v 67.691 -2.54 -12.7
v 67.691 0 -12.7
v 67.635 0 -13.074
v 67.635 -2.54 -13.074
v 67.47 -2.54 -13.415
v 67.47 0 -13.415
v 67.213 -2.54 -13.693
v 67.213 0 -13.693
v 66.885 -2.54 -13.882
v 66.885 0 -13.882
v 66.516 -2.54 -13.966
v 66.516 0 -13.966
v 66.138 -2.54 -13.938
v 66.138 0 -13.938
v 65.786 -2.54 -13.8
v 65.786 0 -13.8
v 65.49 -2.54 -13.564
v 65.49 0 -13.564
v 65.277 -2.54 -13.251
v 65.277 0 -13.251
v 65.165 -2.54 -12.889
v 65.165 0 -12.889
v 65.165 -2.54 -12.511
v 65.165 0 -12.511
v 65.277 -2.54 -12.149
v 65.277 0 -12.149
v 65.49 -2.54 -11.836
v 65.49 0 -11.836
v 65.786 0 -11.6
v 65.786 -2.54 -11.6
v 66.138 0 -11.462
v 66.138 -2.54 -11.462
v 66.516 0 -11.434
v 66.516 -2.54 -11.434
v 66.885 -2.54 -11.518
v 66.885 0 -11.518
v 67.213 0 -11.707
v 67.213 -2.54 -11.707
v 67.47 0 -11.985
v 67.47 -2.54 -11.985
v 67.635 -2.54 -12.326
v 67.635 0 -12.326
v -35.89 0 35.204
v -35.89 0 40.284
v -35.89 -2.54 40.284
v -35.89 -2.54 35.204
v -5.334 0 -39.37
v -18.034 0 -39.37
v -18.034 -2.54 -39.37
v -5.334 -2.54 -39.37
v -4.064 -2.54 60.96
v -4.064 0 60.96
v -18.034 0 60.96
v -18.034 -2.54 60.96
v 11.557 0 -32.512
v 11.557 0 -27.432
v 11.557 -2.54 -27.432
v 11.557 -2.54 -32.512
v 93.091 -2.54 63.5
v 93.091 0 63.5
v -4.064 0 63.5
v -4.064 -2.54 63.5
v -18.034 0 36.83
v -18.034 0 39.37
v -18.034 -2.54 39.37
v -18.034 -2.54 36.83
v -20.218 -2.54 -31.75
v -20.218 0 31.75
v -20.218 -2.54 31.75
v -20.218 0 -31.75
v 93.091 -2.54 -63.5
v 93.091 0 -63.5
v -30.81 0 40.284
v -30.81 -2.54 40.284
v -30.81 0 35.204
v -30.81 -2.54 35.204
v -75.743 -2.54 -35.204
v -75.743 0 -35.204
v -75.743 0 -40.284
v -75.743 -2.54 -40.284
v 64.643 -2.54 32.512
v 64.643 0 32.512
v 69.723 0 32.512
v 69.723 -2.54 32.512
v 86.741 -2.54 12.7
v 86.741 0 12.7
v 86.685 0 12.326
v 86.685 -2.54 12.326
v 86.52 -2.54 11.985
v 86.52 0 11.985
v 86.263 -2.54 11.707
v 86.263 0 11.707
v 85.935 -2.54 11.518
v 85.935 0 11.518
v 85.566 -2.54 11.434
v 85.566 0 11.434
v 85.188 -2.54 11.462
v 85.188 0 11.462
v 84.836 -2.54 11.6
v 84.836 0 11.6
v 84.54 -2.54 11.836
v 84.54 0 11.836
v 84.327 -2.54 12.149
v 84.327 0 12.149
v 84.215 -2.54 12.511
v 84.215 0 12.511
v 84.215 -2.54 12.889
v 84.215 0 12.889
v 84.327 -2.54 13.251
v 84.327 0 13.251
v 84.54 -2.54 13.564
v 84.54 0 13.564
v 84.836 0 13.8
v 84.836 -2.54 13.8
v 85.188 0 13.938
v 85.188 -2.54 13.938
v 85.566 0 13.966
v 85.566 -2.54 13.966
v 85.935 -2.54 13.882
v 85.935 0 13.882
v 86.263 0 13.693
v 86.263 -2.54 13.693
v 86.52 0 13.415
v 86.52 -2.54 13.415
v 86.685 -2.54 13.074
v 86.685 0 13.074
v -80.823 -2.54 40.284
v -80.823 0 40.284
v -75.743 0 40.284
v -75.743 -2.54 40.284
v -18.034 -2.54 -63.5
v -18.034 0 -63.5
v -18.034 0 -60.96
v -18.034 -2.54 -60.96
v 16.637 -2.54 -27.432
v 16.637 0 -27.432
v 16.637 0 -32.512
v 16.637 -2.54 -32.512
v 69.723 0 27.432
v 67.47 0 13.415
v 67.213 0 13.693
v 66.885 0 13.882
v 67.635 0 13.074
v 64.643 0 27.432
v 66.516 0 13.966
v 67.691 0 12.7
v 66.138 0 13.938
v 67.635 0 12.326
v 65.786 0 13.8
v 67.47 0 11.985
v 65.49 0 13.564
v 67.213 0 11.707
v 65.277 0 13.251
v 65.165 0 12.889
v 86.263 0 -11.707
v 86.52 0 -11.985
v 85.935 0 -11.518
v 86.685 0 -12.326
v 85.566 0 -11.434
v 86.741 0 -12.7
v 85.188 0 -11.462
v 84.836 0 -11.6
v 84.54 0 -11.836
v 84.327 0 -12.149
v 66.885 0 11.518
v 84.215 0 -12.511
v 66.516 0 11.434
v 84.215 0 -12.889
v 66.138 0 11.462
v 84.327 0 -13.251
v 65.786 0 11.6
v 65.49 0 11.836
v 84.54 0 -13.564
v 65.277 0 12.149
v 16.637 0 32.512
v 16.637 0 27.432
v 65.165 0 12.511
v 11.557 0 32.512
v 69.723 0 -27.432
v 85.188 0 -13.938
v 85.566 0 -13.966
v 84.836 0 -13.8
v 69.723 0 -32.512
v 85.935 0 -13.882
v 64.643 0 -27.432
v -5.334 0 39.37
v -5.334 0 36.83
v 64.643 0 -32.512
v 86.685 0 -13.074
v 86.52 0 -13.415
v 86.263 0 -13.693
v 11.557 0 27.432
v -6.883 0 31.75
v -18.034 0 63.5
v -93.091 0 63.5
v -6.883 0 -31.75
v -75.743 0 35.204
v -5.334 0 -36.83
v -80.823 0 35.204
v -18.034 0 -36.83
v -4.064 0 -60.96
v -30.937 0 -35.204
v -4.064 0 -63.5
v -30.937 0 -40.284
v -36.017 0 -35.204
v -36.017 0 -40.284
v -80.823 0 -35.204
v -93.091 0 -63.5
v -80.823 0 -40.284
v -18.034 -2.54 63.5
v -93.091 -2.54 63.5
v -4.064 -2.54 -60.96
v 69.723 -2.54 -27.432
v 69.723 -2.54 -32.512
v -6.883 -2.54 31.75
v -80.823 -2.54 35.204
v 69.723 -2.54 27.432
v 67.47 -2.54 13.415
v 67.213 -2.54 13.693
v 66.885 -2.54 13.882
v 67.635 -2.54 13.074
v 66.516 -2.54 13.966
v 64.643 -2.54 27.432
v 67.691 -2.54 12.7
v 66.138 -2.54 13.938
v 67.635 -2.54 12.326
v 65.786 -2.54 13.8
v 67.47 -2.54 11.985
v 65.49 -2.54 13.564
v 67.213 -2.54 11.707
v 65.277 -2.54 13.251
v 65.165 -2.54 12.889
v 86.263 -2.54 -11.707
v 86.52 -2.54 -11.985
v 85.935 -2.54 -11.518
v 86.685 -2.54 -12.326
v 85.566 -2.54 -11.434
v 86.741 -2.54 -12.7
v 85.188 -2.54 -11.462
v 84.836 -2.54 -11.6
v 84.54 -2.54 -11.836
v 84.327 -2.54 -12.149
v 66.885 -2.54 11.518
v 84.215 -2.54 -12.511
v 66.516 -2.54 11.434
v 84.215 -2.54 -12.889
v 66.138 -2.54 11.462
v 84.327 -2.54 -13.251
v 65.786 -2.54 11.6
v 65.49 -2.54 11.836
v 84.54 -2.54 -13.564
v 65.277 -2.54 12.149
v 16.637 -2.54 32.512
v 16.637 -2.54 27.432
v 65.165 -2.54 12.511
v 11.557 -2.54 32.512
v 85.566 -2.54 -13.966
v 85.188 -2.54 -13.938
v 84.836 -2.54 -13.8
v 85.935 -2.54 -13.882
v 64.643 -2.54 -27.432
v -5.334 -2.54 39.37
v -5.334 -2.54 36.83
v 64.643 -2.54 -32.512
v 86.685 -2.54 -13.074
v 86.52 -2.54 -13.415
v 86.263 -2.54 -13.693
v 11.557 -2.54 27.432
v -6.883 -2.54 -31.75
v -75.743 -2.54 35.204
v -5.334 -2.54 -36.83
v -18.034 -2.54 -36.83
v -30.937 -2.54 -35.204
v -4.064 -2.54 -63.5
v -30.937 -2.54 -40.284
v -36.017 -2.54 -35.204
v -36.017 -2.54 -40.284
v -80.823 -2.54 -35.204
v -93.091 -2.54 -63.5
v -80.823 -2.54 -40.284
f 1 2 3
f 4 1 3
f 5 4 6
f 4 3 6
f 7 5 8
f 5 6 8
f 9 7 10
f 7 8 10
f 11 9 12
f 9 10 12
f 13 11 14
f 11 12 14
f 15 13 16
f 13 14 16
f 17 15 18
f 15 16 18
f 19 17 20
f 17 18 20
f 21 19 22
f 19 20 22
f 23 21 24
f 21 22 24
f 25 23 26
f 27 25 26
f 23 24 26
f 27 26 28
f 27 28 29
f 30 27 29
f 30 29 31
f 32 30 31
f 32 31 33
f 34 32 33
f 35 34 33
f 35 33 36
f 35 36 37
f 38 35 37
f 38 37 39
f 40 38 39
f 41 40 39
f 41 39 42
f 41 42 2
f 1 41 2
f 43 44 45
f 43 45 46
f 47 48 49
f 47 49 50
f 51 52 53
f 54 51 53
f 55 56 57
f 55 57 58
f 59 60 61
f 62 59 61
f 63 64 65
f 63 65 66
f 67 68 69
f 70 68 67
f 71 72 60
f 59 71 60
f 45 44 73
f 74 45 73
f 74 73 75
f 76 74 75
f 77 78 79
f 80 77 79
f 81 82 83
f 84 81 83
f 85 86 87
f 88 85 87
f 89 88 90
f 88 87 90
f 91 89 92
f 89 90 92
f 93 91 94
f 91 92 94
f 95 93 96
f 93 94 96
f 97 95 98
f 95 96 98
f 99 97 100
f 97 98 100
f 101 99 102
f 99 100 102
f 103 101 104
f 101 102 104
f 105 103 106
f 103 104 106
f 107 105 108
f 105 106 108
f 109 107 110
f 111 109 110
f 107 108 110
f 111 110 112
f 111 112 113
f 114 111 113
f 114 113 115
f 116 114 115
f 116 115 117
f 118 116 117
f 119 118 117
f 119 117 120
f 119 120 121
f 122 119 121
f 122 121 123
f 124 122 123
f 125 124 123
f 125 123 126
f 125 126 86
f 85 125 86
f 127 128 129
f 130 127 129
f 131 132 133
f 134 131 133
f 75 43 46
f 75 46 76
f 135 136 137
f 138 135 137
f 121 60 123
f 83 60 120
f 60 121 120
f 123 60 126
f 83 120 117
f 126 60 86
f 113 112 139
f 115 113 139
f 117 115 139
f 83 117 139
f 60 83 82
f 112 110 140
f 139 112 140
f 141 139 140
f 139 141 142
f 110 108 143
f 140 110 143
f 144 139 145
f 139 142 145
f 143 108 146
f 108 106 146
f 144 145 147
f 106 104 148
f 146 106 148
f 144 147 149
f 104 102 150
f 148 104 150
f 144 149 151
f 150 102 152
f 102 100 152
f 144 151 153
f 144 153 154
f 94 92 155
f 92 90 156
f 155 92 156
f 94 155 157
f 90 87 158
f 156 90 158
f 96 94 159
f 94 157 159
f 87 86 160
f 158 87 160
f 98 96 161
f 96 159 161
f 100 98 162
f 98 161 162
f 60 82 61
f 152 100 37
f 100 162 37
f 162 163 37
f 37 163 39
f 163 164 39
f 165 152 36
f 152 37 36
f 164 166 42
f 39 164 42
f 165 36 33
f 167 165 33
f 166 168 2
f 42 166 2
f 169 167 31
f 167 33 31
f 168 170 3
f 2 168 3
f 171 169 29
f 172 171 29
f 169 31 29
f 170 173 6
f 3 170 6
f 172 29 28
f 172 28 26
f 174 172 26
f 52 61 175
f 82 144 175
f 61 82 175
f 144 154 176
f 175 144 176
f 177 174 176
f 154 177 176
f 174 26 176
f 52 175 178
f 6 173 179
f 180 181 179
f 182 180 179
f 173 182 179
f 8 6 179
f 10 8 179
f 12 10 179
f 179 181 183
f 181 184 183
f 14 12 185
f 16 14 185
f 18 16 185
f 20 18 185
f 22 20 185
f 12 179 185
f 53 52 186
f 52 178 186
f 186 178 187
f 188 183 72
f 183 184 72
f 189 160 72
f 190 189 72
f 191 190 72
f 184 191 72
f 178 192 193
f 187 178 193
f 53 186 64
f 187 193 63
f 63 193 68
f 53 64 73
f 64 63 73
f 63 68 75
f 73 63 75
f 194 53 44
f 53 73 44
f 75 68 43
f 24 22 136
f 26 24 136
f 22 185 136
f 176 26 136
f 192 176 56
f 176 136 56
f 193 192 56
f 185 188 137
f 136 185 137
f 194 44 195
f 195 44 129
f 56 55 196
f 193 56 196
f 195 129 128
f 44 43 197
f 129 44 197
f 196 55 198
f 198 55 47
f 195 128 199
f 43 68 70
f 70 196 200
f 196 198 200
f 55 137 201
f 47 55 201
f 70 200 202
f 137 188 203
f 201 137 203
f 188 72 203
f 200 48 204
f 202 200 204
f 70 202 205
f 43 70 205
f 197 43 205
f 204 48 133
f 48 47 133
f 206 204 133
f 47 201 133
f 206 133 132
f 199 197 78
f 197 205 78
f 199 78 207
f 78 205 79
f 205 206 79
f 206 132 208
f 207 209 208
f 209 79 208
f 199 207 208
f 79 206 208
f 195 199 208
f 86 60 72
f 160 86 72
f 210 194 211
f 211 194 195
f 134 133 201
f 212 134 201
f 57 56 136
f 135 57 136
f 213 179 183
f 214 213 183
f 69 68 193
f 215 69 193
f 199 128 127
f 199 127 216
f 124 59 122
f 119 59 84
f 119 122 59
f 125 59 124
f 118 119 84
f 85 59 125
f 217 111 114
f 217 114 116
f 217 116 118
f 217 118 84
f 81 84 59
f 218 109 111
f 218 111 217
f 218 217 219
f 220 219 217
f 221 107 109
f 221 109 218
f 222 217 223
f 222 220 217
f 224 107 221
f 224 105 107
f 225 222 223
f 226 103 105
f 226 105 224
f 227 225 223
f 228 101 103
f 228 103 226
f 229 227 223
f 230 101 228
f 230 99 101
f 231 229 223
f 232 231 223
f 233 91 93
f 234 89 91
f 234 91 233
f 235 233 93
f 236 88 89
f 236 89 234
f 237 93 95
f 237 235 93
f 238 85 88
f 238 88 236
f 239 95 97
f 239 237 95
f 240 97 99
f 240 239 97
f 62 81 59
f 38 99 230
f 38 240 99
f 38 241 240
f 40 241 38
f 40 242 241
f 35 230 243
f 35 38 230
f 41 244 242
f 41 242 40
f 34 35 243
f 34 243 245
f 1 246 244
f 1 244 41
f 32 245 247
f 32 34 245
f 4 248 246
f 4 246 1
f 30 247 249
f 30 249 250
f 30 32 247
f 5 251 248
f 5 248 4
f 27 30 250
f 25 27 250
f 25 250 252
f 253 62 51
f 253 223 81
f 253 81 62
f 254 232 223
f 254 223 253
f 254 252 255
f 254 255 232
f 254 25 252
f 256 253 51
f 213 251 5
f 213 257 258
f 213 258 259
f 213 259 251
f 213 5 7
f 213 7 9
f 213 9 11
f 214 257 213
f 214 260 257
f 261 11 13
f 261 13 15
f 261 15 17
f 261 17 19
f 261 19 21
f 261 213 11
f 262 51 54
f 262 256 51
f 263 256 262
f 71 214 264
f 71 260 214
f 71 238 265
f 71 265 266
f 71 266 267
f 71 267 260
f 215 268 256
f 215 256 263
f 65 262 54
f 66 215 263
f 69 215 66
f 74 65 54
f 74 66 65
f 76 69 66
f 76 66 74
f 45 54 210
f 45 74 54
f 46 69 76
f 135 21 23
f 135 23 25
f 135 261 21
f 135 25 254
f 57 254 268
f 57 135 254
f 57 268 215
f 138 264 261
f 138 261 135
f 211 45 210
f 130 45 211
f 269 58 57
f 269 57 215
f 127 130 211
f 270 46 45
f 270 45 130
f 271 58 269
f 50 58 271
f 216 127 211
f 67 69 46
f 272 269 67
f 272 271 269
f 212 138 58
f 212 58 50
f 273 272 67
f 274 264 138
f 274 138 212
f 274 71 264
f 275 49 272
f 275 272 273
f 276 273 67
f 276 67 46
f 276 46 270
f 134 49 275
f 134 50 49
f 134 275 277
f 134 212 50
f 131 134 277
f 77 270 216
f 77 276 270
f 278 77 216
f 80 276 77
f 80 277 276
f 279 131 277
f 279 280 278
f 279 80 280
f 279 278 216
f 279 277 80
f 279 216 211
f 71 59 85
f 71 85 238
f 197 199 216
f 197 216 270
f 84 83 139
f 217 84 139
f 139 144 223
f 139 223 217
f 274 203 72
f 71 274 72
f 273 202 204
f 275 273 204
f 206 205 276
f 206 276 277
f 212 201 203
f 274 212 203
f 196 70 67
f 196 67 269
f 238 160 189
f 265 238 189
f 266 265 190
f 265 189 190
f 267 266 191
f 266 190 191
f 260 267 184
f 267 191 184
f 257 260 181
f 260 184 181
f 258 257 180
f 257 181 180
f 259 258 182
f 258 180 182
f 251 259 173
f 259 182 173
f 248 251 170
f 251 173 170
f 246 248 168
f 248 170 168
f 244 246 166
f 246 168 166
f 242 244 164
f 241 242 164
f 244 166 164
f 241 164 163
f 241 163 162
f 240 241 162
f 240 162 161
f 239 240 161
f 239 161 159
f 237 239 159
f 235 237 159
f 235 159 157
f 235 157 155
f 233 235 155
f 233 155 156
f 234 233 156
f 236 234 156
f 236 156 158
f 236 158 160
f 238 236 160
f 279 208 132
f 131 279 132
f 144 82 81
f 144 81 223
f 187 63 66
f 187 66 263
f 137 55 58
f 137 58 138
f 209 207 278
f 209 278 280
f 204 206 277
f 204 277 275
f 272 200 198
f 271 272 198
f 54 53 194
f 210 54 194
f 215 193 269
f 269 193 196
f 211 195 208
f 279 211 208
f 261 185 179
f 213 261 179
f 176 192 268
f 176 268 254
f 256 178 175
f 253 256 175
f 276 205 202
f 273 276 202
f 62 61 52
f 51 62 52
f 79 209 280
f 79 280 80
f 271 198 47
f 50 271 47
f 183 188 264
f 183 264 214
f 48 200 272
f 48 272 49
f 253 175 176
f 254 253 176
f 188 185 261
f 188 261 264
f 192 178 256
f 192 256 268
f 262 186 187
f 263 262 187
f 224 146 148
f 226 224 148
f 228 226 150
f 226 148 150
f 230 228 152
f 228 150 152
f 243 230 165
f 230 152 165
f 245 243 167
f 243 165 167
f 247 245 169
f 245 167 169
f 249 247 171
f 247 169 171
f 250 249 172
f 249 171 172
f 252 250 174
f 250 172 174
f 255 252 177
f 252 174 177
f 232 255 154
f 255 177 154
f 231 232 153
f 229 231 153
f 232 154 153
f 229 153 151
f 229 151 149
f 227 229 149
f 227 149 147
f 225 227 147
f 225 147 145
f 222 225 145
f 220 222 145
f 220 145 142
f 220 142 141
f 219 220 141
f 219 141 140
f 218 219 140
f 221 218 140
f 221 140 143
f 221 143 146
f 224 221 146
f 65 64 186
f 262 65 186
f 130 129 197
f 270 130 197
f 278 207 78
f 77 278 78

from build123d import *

# Parameters (mm, degrees)
BOSS_EXTRUDE1_DEPTH = 2.54
CUT_EXTRUDE1_REACH  = 4.54
SKETCH2_R           = 1.27
SKETCH2_W           = 5.08
SKETCH2_H           = 5.08
SKETCH2_W_2         = 13.335
SKETCH2_H_2         = 63.5
SKETCH2_W_3         = 12.7
SKETCH2_H_3         = 2.54


with BuildPart() as part:
    # Sketch1 → Boss-Extrude1 (new body)
    with BuildSketch(Plane(origin=(0, 0, 0), x_dir=(1, 0, 0), z_dir=(0, 1, 0))):
        Polygon((-18.034, 63.5), (-18.034, 60.96), (-4.064, 60.96), (-4.064, 63.5), (93.091, 63.5), (93.091, -63.5), (-4.064, -63.5), (-4.064, -60.96), (-18.034, -60.96), (-18.034, -63.5), (-93.091, -63.5), (-93.091, 63.5), align=None)
    extrude(amount=-BOSS_EXTRUDE1_DEPTH)

    # Sketch2 → Cut-Extrude1 (cut, up to next)
    with BuildSketch(Plane(origin=(0, 0, 0), x_dir=(1, 0, 0), z_dir=(0, 1, 0)), mode=Mode.PRIVATE) as cut_extrude1_sk1:
        with Locations((85.471, -12.7)):
            Circle(SKETCH2_R)
    cut_extrude1_tool1 = extrude(cut_extrude1_sk1.sketch, amount=-CUT_EXTRUDE1_REACH, mode=Mode.PRIVATE) & part.part
    add(cut_extrude1_tool1.solids().sort_by_distance((85.471, 0, 12.7))[0], mode=Mode.SUBTRACT)
    # Sketch2 → Cut-Extrude1 (cut, up to next)
    with BuildSketch(Plane(origin=(0, 0, 0), x_dir=(1, 0, 0), z_dir=(0, 1, 0)), mode=Mode.PRIVATE) as cut_extrude1_sk2:
        with Locations((66.421, -12.7)):
            Circle(SKETCH2_R)
    cut_extrude1_tool2 = extrude(cut_extrude1_sk2.sketch, amount=-CUT_EXTRUDE1_REACH, mode=Mode.PRIVATE) & part.part
    add(cut_extrude1_tool2.solids().sort_by_distance((66.421, 0, 12.7))[0], mode=Mode.SUBTRACT)
    # Sketch2 → Cut-Extrude1 (cut, up to next)
    with BuildSketch(Plane(origin=(0, 0, 0), x_dir=(1, 0, 0), z_dir=(0, 1, 0)), mode=Mode.PRIVATE) as cut_extrude1_sk3:
        with Locations((85.471, 12.7)):
            Circle(SKETCH2_R)
    cut_extrude1_tool3 = extrude(cut_extrude1_sk3.sketch, amount=-CUT_EXTRUDE1_REACH, mode=Mode.PRIVATE) & part.part
    add(cut_extrude1_tool3.solids().sort_by_distance((85.471, 0, -12.7))[0], mode=Mode.SUBTRACT)
    # Sketch2 → Cut-Extrude1 (cut, up to next)
    with BuildSketch(Plane(origin=(0, 0, 0), x_dir=(1, 0, 0), z_dir=(0, 1, 0)), mode=Mode.PRIVATE) as cut_extrude1_sk4:
        with Locations((66.421, 12.7)):
            Circle(SKETCH2_R)
    cut_extrude1_tool4 = extrude(cut_extrude1_sk4.sketch, amount=-CUT_EXTRUDE1_REACH, mode=Mode.PRIVATE) & part.part
    add(cut_extrude1_tool4.solids().sort_by_distance((66.421, 0, -12.7))[0], mode=Mode.SUBTRACT)
    # Sketch2 → Cut-Extrude1 (cut, up to next)
    with BuildSketch(Plane(origin=(0, 0, 0), x_dir=(1, 0, 0), z_dir=(0, 1, 0)), mode=Mode.PRIVATE) as cut_extrude1_sk5:
        with Locations((-78.2828, -37.7444)):
            Rectangle(SKETCH2_W, SKETCH2_H)
    cut_extrude1_tool5 = extrude(cut_extrude1_sk5.sketch, amount=-CUT_EXTRUDE1_REACH, mode=Mode.PRIVATE) & part.part
    add(cut_extrude1_tool5.solids().sort_by_distance((-78.2828, 0, 37.7444))[0], mode=Mode.SUBTRACT)
    # Sketch2 → Cut-Extrude1 (cut, up to next)
    with BuildSketch(Plane(origin=(0, 0, 0), x_dir=(1, 0, 0), z_dir=(0, 1, 0)), mode=Mode.PRIVATE) as cut_extrude1_sk6:
        with Locations((-78.2828, 37.7444)):
            Rectangle(SKETCH2_W, SKETCH2_H)
    cut_extrude1_tool6 = extrude(cut_extrude1_sk6.sketch, amount=-CUT_EXTRUDE1_REACH, mode=Mode.PRIVATE) & part.part
    add(cut_extrude1_tool6.solids().sort_by_distance((-78.2828, 0, -37.7444))[0], mode=Mode.SUBTRACT)
    # Sketch2 → Cut-Extrude1 (cut, up to next)
    with BuildSketch(Plane(origin=(0, 0, 0), x_dir=(1, 0, 0), z_dir=(0, 1, 0)), mode=Mode.PRIVATE) as cut_extrude1_sk7:
        with Locations((-13.5509, 0)):
            Rectangle(SKETCH2_W_2, SKETCH2_H_2)
    cut_extrude1_tool7 = extrude(cut_extrude1_sk7.sketch, amount=-CUT_EXTRUDE1_REACH, mode=Mode.PRIVATE) & part.part
    add(cut_extrude1_tool7.solids().sort_by_distance((-13.5509, 0, 0))[0], mode=Mode.SUBTRACT)
    # Sketch2 → Cut-Extrude1 (cut, up to next)
    with BuildSketch(Plane(origin=(0, 0, 0), x_dir=(1, 0, 0), z_dir=(0, 1, 0)), mode=Mode.PRIVATE) as cut_extrude1_sk8:
        with Locations((-11.684, 38.1)):
            Rectangle(SKETCH2_W_3, SKETCH2_H_3)
    cut_extrude1_tool8 = extrude(cut_extrude1_sk8.sketch, amount=-CUT_EXTRUDE1_REACH, mode=Mode.PRIVATE) & part.part
    add(cut_extrude1_tool8.solids().sort_by_distance((-11.684, 0, -38.1))[0], mode=Mode.SUBTRACT)
    # Sketch2 → Cut-Extrude1 (cut, up to next)
    with BuildSketch(Plane(origin=(0, 0, 0), x_dir=(1, 0, 0), z_dir=(0, 1, 0)), mode=Mode.PRIVATE) as cut_extrude1_sk9:
        with Locations((-11.684, -38.1)):
            Rectangle(SKETCH2_W_3, SKETCH2_H_3)
    cut_extrude1_tool9 = extrude(cut_extrude1_sk9.sketch, amount=-CUT_EXTRUDE1_REACH, mode=Mode.PRIVATE) & part.part
    add(cut_extrude1_tool9.solids().sort_by_distance((-11.684, 0, 38.1))[0], mode=Mode.SUBTRACT)
    # Sketch2 → Cut-Extrude1 (cut, up to next)
    with BuildSketch(Plane(origin=(0, 0, 0), x_dir=(1, 0, 0), z_dir=(0, 1, 0)), mode=Mode.PRIVATE) as cut_extrude1_sk10:
        with Locations((67.183, -29.972)):
            Rectangle(SKETCH2_W, SKETCH2_H)
    cut_extrude1_tool10 = extrude(cut_extrude1_sk10.sketch, amount=-CUT_EXTRUDE1_REACH, mode=Mode.PRIVATE) & part.part
    add(cut_extrude1_tool10.solids().sort_by_distance((67.183, 0, 29.972))[0], mode=Mode.SUBTRACT)
    # Sketch2 → Cut-Extrude1 (cut, up to next)
    with BuildSketch(Plane(origin=(0, 0, 0), x_dir=(1, 0, 0), z_dir=(0, 1, 0)), mode=Mode.PRIVATE) as cut_extrude1_sk11:
        with Locations((-33.4772, 37.7444)):
            Rectangle(SKETCH2_W, SKETCH2_H)
    cut_extrude1_tool11 = extrude(cut_extrude1_sk11.sketch, amount=-CUT_EXTRUDE1_REACH, mode=Mode.PRIVATE) & part.part
    add(cut_extrude1_tool11.solids().sort_by_distance((-33.4772, 0, -37.7444))[0], mode=Mode.SUBTRACT)
    # Sketch2 → Cut-Extrude1 (cut, up to next)
    with BuildSketch(Plane(origin=(0, 0, 0), x_dir=(1, 0, 0), z_dir=(0, 1, 0)), mode=Mode.PRIVATE) as cut_extrude1_sk12:
        with Locations((-33.3502, -37.7444)):
            Rectangle(SKETCH2_W, SKETCH2_H)
    cut_extrude1_tool12 = extrude(cut_extrude1_sk12.sketch, amount=-CUT_EXTRUDE1_REACH, mode=Mode.PRIVATE) & part.part
    add(cut_extrude1_tool12.solids().sort_by_distance((-33.3502, 0, 37.7444))[0], mode=Mode.SUBTRACT)
    # Sketch2 → Cut-Extrude1 (cut, up to next)
    with BuildSketch(Plane(origin=(0, 0, 0), x_dir=(1, 0, 0), z_dir=(0, 1, 0)), mode=Mode.PRIVATE) as cut_extrude1_sk13:
        with Locations((67.183, 29.972)):
            Rectangle(SKETCH2_W, SKETCH2_H)
    cut_extrude1_tool13 = extrude(cut_extrude1_sk13.sketch, amount=-CUT_EXTRUDE1_REACH, mode=Mode.PRIVATE) & part.part
    add(cut_extrude1_tool13.solids().sort_by_distance((67.183, 0, -29.972))[0], mode=Mode.SUBTRACT)
    # Sketch2 → Cut-Extrude1 (cut, up to next)
    with BuildSketch(Plane(origin=(0, 0, 0), x_dir=(1, 0, 0), z_dir=(0, 1, 0)), mode=Mode.PRIVATE) as cut_extrude1_sk14:
        with Locations((14.097, 29.972)):
            Rectangle(SKETCH2_W, SKETCH2_H)
    cut_extrude1_tool14 = extrude(cut_extrude1_sk14.sketch, amount=-CUT_EXTRUDE1_REACH, mode=Mode.PRIVATE) & part.part
    add(cut_extrude1_tool14.solids().sort_by_distance((14.097, 0, -29.972))[0], mode=Mode.SUBTRACT)
    # Sketch2 → Cut-Extrude1 (cut, up to next)
    with BuildSketch(Plane(origin=(0, 0, 0), x_dir=(1, 0, 0), z_dir=(0, 1, 0)), mode=Mode.PRIVATE) as cut_extrude1_sk15:
        with Locations((14.097, -29.972)):
            Rectangle(SKETCH2_W, SKETCH2_H)
    cut_extrude1_tool15 = extrude(cut_extrude1_sk15.sketch, amount=-CUT_EXTRUDE1_REACH, mode=Mode.PRIVATE) & part.part
    add(cut_extrude1_tool15.solids().sort_by_distance((14.097, 0, 29.972))[0], mode=Mode.SUBTRACT)


solid = part.part
